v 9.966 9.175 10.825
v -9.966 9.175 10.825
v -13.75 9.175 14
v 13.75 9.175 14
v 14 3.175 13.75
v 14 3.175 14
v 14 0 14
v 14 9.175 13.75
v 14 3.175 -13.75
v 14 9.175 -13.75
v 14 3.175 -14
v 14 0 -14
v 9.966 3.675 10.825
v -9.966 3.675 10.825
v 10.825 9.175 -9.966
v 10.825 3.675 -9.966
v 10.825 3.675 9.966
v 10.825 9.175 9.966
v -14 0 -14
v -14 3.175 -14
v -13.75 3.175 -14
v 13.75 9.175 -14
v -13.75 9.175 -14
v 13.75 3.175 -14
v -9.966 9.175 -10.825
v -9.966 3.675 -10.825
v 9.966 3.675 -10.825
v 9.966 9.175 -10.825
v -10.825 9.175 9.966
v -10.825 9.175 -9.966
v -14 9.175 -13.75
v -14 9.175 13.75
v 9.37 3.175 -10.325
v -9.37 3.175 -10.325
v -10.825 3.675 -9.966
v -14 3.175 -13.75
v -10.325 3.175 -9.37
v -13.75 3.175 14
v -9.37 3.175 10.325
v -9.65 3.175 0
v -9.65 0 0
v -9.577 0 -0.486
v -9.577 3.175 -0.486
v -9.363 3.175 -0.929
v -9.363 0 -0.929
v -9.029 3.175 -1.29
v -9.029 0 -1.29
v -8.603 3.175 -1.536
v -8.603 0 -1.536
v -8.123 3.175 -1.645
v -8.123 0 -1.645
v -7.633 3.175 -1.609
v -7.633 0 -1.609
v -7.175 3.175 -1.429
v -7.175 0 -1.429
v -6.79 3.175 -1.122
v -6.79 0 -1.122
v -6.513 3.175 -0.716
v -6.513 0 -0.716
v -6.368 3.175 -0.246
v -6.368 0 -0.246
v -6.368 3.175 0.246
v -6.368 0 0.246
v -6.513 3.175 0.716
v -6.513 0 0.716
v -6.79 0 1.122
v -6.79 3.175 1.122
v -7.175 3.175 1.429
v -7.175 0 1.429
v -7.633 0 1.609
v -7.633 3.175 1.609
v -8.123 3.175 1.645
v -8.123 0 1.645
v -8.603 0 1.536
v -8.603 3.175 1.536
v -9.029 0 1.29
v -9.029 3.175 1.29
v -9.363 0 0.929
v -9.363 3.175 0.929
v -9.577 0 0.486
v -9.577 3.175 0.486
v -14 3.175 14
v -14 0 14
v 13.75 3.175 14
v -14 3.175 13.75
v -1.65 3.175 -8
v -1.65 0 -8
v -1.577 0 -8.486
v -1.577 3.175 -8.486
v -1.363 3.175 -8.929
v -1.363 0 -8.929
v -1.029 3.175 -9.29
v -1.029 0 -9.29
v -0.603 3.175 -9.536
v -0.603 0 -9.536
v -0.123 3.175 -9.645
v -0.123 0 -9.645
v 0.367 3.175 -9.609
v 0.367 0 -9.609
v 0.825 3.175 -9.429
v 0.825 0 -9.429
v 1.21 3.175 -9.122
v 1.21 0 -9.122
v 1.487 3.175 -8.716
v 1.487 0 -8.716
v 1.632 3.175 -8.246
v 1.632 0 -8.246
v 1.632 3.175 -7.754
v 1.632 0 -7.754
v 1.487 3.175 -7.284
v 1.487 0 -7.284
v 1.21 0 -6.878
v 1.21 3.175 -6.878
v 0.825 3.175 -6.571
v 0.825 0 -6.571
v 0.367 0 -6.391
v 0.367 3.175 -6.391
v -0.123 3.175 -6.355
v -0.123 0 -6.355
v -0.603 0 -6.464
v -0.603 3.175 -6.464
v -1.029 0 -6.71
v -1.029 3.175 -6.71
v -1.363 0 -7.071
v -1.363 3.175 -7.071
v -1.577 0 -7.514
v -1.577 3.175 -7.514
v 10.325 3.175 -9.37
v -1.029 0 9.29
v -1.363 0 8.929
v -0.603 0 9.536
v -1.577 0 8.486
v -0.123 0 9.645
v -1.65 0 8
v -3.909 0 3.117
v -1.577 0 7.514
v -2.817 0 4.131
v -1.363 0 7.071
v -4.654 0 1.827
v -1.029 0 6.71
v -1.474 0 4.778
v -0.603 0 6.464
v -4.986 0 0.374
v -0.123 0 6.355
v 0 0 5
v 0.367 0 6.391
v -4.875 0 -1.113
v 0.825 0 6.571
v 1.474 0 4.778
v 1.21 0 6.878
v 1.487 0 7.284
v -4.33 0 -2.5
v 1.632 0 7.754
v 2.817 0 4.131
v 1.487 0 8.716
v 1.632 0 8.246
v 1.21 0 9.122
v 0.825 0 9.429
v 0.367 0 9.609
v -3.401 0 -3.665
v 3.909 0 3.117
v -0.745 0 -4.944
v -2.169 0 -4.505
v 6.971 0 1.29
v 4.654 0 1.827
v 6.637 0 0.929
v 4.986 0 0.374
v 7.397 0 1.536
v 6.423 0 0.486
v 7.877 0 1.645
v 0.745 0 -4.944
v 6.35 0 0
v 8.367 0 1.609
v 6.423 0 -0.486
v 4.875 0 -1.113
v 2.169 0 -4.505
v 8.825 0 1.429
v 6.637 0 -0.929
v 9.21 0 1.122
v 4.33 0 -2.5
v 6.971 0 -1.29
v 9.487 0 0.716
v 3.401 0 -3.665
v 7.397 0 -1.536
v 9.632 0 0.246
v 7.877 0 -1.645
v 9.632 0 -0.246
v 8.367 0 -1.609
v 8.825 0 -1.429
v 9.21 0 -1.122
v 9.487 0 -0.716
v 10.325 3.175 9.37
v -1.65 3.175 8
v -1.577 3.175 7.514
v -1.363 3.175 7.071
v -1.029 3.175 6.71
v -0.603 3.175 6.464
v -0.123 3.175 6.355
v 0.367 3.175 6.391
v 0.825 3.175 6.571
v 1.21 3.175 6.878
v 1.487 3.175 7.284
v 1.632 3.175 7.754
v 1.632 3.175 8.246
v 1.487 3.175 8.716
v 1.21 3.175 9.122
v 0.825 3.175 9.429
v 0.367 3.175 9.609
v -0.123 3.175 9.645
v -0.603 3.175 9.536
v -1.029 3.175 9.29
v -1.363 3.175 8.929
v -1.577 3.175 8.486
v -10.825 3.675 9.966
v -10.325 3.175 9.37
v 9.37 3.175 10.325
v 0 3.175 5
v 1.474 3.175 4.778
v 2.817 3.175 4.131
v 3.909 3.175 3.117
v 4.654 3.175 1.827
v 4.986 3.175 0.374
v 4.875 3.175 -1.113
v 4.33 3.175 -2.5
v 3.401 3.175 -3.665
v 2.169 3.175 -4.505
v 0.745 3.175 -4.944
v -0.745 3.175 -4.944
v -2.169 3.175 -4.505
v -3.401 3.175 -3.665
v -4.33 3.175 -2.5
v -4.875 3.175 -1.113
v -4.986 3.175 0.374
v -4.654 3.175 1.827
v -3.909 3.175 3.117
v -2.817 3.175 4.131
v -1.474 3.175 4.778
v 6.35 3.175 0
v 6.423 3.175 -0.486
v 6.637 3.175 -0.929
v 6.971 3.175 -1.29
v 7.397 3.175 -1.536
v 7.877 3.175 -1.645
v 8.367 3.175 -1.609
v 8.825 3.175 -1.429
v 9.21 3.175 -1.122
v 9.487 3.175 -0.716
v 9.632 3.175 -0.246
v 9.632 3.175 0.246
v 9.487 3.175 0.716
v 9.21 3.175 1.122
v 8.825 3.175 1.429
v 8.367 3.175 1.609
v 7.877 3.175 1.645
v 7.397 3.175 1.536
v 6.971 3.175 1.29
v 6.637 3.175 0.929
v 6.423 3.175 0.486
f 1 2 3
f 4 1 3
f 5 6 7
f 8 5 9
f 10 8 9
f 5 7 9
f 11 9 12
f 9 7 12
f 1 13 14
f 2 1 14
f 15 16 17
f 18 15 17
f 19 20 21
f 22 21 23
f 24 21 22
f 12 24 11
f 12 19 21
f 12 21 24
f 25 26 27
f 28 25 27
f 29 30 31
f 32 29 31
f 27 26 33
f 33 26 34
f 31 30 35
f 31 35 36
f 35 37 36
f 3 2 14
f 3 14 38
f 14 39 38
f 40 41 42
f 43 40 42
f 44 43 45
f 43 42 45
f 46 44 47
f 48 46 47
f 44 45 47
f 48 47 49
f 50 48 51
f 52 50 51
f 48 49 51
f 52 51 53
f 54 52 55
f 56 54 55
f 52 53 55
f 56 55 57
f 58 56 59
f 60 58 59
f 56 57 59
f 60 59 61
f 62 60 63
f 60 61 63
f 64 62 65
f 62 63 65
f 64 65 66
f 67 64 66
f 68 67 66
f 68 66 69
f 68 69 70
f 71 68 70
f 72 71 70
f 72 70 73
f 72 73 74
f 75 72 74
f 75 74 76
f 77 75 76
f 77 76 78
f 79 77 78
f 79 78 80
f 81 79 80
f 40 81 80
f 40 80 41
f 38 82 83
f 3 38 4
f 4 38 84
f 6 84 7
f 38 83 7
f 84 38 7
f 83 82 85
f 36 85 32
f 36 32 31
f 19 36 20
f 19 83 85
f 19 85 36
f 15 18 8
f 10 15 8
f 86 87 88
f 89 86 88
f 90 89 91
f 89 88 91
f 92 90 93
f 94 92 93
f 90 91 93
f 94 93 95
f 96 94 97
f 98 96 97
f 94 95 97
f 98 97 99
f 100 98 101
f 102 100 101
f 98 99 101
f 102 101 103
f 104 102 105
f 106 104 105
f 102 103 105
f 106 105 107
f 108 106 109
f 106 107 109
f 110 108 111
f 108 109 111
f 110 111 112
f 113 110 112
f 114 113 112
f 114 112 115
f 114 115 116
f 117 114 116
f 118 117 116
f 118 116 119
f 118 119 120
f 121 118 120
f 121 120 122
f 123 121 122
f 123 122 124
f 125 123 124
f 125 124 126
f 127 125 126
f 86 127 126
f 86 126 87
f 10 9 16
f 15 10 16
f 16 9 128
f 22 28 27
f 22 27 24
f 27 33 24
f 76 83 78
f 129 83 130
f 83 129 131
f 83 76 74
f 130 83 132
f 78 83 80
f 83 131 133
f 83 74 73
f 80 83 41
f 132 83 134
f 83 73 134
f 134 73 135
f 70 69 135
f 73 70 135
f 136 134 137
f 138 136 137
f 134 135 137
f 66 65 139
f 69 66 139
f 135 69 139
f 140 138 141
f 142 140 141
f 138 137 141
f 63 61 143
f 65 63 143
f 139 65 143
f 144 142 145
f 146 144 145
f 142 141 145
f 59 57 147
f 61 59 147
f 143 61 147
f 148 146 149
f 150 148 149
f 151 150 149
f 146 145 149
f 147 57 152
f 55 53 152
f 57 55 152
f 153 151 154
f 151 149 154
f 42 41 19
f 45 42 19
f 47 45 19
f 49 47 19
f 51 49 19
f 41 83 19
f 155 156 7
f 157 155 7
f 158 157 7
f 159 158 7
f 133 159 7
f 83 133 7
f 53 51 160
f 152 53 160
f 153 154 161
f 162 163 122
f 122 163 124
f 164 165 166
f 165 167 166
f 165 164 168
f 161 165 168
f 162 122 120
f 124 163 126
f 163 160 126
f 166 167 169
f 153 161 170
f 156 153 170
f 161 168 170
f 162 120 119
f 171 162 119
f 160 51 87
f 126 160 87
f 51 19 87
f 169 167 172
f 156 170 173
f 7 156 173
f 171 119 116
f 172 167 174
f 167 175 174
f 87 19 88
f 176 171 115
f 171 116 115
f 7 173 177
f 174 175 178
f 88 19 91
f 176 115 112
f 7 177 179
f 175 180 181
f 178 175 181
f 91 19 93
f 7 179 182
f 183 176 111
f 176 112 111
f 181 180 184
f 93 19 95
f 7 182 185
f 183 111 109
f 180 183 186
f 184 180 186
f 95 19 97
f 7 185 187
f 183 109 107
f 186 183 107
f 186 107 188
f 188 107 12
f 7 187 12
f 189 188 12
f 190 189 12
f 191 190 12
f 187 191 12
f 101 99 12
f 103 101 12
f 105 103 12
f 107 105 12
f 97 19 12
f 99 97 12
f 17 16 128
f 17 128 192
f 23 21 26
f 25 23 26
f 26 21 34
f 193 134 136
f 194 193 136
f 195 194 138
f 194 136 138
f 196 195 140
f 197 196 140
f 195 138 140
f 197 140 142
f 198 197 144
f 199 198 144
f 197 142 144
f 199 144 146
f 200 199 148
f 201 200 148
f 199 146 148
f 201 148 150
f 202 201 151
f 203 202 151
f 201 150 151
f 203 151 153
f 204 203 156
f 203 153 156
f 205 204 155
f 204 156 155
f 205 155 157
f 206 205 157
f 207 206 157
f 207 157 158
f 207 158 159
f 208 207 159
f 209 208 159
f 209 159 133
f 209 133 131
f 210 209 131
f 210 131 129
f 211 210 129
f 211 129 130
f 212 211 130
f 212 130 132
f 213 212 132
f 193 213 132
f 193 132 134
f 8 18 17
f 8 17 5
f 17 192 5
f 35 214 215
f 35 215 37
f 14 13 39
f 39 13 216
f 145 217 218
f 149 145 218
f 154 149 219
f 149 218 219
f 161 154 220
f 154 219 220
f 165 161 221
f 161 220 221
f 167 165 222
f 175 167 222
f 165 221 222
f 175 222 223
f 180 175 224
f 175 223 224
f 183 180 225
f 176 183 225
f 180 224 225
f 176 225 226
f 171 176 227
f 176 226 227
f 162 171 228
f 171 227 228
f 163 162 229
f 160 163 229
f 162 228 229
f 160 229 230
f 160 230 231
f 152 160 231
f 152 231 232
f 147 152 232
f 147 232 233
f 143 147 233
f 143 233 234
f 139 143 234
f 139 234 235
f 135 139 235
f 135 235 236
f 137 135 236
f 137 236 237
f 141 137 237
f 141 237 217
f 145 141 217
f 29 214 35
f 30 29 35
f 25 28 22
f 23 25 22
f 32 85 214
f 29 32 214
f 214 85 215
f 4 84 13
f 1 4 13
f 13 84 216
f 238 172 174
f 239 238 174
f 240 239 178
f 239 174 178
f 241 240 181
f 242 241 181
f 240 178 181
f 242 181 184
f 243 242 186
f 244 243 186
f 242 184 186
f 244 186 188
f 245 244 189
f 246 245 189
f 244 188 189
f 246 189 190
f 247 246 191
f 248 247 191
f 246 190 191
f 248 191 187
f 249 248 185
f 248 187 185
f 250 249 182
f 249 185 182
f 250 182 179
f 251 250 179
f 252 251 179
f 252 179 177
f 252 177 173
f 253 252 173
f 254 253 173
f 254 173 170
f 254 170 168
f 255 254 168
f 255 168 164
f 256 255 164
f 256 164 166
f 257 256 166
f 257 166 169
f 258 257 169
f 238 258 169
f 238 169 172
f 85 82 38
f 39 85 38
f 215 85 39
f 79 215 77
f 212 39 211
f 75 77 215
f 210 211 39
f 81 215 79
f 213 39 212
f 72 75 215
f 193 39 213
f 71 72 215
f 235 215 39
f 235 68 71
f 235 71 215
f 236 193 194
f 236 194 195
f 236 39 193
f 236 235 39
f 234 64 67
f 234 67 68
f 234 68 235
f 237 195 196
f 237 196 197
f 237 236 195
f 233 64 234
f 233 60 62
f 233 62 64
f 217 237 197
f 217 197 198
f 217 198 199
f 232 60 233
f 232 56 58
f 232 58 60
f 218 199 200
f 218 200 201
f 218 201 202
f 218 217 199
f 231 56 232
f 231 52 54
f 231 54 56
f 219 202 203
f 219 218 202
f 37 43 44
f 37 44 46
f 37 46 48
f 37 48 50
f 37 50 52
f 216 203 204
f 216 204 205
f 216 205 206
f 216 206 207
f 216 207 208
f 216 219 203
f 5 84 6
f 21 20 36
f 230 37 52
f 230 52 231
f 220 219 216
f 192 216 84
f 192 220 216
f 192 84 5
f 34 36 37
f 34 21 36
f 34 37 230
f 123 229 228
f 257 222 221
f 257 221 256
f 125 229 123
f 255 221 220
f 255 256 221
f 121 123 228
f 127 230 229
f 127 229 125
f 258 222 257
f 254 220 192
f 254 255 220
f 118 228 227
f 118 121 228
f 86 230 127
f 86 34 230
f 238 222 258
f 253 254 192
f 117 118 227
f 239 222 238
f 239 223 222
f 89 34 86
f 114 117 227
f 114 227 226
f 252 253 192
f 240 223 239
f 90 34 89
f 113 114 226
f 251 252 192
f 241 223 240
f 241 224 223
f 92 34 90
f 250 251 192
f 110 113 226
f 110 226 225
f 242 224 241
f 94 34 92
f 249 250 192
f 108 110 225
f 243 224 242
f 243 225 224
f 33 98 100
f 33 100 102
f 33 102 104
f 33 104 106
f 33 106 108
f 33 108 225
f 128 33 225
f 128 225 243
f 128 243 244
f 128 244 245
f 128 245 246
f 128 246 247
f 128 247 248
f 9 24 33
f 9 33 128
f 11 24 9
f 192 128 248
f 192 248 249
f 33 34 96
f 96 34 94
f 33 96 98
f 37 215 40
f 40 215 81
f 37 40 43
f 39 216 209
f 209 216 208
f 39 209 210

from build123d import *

# Parameters (mm, degrees)
SKETCH1_W                 = 28
SKETCH1_H                 = 28
BOSS_EXTRUDE1_DEPTH       = 3.175
SKETCH2_R                 = 5
CUT_EXTRUDE1_DEPTH        = 21.05194816
F_3_0MM_DOWEL_HOLE1_D     = 3.3
F_3_0MM_DOWEL_HOLE1_DEPTH = 15
F_3_0MM_DOWEL_HOLE1_TIP   = 0.991420021
BOSS_EXTRUDE3_DEPTH       = 6
CIRPATTERN2_COUNT         = 4
CHAMFER2_SIZE             = 0.5


with BuildPart() as part:
    # Sketch1 → Boss-Extrude1 (new body)
    with BuildSketch(Plane(origin=(0, 0, 0), x_dir=(1, 0, 0), z_dir=(0, 1, 0))):
        Rectangle(SKETCH1_W, SKETCH1_H)
    extrude(amount=BOSS_EXTRUDE1_DEPTH)

    # Sketch2 → Cut-Extrude1 (cut, through all)
    with BuildSketch(Plane(origin=(0, 3.175, 0), x_dir=(1, 0, 0), z_dir=(0, 1, 0))):
        with Locations(Location((0, 0, 0), (0, 0, 270))):
            Circle(SKETCH2_R)
    extrude(amount=-CUT_EXTRUDE1_DEPTH, mode=Mode.SUBTRACT)

    # Ø3.0mm Dowel Hole1
    with Locations(Plane(origin=(0, 3.175, 0), x_dir=(1, 0, 0), z_dir=(0, 1, 0))):
        with Locations((8, 0), (0, -8), (-8, 0), (0, 8)):
            Hole(F_3_0MM_DOWEL_HOLE1_D / 2, depth=F_3_0MM_DOWEL_HOLE1_DEPTH)
            with Locations((0, 0, -(F_3_0MM_DOWEL_HOLE1_DEPTH + F_3_0MM_DOWEL_HOLE1_TIP / 2))):  # 118° drill point
                Cone(0, F_3_0MM_DOWEL_HOLE1_D / 2, F_3_0MM_DOWEL_HOLE1_TIP, mode=Mode.SUBTRACT)

    # Sketch7 → Boss-Extrude3 (add)
    with BuildSketch(Plane(origin=(0, 3.175, 0), x_dir=(1, 0, 0), z_dir=(0, 1, 0))):
        Polygon((-13.75, -14), (13.75, -14), (9.966182344, -10.825), (-9.966182344, -10.825), align=None)
    boss_extrude3 = extrude(amount=BOSS_EXTRUDE3_DEPTH)

    # CirPattern2: Boss-Extrude3 ×4 about axis
    cirpattern2_axis = Axis((0, 0, 0), (0, 1, 0))
    for i in range(1, CIRPATTERN2_COUNT):
        add(boss_extrude3.rotate(cirpattern2_axis, i * 360 / CIRPATTERN2_COUNT))

    # Chamfer2
    chamfer2_edges = [part.edges().sort_by_distance(p)[0] for p in [
        (0, 3.175, 10.825),
        (10.825, 3.175, 0),
        (0, 3.175, -10.825),
        (-10.825, 3.175, 0),
    ]]
    chamfer(chamfer2_edges, length=CHAMFER2_SIZE)


solid = part.part
